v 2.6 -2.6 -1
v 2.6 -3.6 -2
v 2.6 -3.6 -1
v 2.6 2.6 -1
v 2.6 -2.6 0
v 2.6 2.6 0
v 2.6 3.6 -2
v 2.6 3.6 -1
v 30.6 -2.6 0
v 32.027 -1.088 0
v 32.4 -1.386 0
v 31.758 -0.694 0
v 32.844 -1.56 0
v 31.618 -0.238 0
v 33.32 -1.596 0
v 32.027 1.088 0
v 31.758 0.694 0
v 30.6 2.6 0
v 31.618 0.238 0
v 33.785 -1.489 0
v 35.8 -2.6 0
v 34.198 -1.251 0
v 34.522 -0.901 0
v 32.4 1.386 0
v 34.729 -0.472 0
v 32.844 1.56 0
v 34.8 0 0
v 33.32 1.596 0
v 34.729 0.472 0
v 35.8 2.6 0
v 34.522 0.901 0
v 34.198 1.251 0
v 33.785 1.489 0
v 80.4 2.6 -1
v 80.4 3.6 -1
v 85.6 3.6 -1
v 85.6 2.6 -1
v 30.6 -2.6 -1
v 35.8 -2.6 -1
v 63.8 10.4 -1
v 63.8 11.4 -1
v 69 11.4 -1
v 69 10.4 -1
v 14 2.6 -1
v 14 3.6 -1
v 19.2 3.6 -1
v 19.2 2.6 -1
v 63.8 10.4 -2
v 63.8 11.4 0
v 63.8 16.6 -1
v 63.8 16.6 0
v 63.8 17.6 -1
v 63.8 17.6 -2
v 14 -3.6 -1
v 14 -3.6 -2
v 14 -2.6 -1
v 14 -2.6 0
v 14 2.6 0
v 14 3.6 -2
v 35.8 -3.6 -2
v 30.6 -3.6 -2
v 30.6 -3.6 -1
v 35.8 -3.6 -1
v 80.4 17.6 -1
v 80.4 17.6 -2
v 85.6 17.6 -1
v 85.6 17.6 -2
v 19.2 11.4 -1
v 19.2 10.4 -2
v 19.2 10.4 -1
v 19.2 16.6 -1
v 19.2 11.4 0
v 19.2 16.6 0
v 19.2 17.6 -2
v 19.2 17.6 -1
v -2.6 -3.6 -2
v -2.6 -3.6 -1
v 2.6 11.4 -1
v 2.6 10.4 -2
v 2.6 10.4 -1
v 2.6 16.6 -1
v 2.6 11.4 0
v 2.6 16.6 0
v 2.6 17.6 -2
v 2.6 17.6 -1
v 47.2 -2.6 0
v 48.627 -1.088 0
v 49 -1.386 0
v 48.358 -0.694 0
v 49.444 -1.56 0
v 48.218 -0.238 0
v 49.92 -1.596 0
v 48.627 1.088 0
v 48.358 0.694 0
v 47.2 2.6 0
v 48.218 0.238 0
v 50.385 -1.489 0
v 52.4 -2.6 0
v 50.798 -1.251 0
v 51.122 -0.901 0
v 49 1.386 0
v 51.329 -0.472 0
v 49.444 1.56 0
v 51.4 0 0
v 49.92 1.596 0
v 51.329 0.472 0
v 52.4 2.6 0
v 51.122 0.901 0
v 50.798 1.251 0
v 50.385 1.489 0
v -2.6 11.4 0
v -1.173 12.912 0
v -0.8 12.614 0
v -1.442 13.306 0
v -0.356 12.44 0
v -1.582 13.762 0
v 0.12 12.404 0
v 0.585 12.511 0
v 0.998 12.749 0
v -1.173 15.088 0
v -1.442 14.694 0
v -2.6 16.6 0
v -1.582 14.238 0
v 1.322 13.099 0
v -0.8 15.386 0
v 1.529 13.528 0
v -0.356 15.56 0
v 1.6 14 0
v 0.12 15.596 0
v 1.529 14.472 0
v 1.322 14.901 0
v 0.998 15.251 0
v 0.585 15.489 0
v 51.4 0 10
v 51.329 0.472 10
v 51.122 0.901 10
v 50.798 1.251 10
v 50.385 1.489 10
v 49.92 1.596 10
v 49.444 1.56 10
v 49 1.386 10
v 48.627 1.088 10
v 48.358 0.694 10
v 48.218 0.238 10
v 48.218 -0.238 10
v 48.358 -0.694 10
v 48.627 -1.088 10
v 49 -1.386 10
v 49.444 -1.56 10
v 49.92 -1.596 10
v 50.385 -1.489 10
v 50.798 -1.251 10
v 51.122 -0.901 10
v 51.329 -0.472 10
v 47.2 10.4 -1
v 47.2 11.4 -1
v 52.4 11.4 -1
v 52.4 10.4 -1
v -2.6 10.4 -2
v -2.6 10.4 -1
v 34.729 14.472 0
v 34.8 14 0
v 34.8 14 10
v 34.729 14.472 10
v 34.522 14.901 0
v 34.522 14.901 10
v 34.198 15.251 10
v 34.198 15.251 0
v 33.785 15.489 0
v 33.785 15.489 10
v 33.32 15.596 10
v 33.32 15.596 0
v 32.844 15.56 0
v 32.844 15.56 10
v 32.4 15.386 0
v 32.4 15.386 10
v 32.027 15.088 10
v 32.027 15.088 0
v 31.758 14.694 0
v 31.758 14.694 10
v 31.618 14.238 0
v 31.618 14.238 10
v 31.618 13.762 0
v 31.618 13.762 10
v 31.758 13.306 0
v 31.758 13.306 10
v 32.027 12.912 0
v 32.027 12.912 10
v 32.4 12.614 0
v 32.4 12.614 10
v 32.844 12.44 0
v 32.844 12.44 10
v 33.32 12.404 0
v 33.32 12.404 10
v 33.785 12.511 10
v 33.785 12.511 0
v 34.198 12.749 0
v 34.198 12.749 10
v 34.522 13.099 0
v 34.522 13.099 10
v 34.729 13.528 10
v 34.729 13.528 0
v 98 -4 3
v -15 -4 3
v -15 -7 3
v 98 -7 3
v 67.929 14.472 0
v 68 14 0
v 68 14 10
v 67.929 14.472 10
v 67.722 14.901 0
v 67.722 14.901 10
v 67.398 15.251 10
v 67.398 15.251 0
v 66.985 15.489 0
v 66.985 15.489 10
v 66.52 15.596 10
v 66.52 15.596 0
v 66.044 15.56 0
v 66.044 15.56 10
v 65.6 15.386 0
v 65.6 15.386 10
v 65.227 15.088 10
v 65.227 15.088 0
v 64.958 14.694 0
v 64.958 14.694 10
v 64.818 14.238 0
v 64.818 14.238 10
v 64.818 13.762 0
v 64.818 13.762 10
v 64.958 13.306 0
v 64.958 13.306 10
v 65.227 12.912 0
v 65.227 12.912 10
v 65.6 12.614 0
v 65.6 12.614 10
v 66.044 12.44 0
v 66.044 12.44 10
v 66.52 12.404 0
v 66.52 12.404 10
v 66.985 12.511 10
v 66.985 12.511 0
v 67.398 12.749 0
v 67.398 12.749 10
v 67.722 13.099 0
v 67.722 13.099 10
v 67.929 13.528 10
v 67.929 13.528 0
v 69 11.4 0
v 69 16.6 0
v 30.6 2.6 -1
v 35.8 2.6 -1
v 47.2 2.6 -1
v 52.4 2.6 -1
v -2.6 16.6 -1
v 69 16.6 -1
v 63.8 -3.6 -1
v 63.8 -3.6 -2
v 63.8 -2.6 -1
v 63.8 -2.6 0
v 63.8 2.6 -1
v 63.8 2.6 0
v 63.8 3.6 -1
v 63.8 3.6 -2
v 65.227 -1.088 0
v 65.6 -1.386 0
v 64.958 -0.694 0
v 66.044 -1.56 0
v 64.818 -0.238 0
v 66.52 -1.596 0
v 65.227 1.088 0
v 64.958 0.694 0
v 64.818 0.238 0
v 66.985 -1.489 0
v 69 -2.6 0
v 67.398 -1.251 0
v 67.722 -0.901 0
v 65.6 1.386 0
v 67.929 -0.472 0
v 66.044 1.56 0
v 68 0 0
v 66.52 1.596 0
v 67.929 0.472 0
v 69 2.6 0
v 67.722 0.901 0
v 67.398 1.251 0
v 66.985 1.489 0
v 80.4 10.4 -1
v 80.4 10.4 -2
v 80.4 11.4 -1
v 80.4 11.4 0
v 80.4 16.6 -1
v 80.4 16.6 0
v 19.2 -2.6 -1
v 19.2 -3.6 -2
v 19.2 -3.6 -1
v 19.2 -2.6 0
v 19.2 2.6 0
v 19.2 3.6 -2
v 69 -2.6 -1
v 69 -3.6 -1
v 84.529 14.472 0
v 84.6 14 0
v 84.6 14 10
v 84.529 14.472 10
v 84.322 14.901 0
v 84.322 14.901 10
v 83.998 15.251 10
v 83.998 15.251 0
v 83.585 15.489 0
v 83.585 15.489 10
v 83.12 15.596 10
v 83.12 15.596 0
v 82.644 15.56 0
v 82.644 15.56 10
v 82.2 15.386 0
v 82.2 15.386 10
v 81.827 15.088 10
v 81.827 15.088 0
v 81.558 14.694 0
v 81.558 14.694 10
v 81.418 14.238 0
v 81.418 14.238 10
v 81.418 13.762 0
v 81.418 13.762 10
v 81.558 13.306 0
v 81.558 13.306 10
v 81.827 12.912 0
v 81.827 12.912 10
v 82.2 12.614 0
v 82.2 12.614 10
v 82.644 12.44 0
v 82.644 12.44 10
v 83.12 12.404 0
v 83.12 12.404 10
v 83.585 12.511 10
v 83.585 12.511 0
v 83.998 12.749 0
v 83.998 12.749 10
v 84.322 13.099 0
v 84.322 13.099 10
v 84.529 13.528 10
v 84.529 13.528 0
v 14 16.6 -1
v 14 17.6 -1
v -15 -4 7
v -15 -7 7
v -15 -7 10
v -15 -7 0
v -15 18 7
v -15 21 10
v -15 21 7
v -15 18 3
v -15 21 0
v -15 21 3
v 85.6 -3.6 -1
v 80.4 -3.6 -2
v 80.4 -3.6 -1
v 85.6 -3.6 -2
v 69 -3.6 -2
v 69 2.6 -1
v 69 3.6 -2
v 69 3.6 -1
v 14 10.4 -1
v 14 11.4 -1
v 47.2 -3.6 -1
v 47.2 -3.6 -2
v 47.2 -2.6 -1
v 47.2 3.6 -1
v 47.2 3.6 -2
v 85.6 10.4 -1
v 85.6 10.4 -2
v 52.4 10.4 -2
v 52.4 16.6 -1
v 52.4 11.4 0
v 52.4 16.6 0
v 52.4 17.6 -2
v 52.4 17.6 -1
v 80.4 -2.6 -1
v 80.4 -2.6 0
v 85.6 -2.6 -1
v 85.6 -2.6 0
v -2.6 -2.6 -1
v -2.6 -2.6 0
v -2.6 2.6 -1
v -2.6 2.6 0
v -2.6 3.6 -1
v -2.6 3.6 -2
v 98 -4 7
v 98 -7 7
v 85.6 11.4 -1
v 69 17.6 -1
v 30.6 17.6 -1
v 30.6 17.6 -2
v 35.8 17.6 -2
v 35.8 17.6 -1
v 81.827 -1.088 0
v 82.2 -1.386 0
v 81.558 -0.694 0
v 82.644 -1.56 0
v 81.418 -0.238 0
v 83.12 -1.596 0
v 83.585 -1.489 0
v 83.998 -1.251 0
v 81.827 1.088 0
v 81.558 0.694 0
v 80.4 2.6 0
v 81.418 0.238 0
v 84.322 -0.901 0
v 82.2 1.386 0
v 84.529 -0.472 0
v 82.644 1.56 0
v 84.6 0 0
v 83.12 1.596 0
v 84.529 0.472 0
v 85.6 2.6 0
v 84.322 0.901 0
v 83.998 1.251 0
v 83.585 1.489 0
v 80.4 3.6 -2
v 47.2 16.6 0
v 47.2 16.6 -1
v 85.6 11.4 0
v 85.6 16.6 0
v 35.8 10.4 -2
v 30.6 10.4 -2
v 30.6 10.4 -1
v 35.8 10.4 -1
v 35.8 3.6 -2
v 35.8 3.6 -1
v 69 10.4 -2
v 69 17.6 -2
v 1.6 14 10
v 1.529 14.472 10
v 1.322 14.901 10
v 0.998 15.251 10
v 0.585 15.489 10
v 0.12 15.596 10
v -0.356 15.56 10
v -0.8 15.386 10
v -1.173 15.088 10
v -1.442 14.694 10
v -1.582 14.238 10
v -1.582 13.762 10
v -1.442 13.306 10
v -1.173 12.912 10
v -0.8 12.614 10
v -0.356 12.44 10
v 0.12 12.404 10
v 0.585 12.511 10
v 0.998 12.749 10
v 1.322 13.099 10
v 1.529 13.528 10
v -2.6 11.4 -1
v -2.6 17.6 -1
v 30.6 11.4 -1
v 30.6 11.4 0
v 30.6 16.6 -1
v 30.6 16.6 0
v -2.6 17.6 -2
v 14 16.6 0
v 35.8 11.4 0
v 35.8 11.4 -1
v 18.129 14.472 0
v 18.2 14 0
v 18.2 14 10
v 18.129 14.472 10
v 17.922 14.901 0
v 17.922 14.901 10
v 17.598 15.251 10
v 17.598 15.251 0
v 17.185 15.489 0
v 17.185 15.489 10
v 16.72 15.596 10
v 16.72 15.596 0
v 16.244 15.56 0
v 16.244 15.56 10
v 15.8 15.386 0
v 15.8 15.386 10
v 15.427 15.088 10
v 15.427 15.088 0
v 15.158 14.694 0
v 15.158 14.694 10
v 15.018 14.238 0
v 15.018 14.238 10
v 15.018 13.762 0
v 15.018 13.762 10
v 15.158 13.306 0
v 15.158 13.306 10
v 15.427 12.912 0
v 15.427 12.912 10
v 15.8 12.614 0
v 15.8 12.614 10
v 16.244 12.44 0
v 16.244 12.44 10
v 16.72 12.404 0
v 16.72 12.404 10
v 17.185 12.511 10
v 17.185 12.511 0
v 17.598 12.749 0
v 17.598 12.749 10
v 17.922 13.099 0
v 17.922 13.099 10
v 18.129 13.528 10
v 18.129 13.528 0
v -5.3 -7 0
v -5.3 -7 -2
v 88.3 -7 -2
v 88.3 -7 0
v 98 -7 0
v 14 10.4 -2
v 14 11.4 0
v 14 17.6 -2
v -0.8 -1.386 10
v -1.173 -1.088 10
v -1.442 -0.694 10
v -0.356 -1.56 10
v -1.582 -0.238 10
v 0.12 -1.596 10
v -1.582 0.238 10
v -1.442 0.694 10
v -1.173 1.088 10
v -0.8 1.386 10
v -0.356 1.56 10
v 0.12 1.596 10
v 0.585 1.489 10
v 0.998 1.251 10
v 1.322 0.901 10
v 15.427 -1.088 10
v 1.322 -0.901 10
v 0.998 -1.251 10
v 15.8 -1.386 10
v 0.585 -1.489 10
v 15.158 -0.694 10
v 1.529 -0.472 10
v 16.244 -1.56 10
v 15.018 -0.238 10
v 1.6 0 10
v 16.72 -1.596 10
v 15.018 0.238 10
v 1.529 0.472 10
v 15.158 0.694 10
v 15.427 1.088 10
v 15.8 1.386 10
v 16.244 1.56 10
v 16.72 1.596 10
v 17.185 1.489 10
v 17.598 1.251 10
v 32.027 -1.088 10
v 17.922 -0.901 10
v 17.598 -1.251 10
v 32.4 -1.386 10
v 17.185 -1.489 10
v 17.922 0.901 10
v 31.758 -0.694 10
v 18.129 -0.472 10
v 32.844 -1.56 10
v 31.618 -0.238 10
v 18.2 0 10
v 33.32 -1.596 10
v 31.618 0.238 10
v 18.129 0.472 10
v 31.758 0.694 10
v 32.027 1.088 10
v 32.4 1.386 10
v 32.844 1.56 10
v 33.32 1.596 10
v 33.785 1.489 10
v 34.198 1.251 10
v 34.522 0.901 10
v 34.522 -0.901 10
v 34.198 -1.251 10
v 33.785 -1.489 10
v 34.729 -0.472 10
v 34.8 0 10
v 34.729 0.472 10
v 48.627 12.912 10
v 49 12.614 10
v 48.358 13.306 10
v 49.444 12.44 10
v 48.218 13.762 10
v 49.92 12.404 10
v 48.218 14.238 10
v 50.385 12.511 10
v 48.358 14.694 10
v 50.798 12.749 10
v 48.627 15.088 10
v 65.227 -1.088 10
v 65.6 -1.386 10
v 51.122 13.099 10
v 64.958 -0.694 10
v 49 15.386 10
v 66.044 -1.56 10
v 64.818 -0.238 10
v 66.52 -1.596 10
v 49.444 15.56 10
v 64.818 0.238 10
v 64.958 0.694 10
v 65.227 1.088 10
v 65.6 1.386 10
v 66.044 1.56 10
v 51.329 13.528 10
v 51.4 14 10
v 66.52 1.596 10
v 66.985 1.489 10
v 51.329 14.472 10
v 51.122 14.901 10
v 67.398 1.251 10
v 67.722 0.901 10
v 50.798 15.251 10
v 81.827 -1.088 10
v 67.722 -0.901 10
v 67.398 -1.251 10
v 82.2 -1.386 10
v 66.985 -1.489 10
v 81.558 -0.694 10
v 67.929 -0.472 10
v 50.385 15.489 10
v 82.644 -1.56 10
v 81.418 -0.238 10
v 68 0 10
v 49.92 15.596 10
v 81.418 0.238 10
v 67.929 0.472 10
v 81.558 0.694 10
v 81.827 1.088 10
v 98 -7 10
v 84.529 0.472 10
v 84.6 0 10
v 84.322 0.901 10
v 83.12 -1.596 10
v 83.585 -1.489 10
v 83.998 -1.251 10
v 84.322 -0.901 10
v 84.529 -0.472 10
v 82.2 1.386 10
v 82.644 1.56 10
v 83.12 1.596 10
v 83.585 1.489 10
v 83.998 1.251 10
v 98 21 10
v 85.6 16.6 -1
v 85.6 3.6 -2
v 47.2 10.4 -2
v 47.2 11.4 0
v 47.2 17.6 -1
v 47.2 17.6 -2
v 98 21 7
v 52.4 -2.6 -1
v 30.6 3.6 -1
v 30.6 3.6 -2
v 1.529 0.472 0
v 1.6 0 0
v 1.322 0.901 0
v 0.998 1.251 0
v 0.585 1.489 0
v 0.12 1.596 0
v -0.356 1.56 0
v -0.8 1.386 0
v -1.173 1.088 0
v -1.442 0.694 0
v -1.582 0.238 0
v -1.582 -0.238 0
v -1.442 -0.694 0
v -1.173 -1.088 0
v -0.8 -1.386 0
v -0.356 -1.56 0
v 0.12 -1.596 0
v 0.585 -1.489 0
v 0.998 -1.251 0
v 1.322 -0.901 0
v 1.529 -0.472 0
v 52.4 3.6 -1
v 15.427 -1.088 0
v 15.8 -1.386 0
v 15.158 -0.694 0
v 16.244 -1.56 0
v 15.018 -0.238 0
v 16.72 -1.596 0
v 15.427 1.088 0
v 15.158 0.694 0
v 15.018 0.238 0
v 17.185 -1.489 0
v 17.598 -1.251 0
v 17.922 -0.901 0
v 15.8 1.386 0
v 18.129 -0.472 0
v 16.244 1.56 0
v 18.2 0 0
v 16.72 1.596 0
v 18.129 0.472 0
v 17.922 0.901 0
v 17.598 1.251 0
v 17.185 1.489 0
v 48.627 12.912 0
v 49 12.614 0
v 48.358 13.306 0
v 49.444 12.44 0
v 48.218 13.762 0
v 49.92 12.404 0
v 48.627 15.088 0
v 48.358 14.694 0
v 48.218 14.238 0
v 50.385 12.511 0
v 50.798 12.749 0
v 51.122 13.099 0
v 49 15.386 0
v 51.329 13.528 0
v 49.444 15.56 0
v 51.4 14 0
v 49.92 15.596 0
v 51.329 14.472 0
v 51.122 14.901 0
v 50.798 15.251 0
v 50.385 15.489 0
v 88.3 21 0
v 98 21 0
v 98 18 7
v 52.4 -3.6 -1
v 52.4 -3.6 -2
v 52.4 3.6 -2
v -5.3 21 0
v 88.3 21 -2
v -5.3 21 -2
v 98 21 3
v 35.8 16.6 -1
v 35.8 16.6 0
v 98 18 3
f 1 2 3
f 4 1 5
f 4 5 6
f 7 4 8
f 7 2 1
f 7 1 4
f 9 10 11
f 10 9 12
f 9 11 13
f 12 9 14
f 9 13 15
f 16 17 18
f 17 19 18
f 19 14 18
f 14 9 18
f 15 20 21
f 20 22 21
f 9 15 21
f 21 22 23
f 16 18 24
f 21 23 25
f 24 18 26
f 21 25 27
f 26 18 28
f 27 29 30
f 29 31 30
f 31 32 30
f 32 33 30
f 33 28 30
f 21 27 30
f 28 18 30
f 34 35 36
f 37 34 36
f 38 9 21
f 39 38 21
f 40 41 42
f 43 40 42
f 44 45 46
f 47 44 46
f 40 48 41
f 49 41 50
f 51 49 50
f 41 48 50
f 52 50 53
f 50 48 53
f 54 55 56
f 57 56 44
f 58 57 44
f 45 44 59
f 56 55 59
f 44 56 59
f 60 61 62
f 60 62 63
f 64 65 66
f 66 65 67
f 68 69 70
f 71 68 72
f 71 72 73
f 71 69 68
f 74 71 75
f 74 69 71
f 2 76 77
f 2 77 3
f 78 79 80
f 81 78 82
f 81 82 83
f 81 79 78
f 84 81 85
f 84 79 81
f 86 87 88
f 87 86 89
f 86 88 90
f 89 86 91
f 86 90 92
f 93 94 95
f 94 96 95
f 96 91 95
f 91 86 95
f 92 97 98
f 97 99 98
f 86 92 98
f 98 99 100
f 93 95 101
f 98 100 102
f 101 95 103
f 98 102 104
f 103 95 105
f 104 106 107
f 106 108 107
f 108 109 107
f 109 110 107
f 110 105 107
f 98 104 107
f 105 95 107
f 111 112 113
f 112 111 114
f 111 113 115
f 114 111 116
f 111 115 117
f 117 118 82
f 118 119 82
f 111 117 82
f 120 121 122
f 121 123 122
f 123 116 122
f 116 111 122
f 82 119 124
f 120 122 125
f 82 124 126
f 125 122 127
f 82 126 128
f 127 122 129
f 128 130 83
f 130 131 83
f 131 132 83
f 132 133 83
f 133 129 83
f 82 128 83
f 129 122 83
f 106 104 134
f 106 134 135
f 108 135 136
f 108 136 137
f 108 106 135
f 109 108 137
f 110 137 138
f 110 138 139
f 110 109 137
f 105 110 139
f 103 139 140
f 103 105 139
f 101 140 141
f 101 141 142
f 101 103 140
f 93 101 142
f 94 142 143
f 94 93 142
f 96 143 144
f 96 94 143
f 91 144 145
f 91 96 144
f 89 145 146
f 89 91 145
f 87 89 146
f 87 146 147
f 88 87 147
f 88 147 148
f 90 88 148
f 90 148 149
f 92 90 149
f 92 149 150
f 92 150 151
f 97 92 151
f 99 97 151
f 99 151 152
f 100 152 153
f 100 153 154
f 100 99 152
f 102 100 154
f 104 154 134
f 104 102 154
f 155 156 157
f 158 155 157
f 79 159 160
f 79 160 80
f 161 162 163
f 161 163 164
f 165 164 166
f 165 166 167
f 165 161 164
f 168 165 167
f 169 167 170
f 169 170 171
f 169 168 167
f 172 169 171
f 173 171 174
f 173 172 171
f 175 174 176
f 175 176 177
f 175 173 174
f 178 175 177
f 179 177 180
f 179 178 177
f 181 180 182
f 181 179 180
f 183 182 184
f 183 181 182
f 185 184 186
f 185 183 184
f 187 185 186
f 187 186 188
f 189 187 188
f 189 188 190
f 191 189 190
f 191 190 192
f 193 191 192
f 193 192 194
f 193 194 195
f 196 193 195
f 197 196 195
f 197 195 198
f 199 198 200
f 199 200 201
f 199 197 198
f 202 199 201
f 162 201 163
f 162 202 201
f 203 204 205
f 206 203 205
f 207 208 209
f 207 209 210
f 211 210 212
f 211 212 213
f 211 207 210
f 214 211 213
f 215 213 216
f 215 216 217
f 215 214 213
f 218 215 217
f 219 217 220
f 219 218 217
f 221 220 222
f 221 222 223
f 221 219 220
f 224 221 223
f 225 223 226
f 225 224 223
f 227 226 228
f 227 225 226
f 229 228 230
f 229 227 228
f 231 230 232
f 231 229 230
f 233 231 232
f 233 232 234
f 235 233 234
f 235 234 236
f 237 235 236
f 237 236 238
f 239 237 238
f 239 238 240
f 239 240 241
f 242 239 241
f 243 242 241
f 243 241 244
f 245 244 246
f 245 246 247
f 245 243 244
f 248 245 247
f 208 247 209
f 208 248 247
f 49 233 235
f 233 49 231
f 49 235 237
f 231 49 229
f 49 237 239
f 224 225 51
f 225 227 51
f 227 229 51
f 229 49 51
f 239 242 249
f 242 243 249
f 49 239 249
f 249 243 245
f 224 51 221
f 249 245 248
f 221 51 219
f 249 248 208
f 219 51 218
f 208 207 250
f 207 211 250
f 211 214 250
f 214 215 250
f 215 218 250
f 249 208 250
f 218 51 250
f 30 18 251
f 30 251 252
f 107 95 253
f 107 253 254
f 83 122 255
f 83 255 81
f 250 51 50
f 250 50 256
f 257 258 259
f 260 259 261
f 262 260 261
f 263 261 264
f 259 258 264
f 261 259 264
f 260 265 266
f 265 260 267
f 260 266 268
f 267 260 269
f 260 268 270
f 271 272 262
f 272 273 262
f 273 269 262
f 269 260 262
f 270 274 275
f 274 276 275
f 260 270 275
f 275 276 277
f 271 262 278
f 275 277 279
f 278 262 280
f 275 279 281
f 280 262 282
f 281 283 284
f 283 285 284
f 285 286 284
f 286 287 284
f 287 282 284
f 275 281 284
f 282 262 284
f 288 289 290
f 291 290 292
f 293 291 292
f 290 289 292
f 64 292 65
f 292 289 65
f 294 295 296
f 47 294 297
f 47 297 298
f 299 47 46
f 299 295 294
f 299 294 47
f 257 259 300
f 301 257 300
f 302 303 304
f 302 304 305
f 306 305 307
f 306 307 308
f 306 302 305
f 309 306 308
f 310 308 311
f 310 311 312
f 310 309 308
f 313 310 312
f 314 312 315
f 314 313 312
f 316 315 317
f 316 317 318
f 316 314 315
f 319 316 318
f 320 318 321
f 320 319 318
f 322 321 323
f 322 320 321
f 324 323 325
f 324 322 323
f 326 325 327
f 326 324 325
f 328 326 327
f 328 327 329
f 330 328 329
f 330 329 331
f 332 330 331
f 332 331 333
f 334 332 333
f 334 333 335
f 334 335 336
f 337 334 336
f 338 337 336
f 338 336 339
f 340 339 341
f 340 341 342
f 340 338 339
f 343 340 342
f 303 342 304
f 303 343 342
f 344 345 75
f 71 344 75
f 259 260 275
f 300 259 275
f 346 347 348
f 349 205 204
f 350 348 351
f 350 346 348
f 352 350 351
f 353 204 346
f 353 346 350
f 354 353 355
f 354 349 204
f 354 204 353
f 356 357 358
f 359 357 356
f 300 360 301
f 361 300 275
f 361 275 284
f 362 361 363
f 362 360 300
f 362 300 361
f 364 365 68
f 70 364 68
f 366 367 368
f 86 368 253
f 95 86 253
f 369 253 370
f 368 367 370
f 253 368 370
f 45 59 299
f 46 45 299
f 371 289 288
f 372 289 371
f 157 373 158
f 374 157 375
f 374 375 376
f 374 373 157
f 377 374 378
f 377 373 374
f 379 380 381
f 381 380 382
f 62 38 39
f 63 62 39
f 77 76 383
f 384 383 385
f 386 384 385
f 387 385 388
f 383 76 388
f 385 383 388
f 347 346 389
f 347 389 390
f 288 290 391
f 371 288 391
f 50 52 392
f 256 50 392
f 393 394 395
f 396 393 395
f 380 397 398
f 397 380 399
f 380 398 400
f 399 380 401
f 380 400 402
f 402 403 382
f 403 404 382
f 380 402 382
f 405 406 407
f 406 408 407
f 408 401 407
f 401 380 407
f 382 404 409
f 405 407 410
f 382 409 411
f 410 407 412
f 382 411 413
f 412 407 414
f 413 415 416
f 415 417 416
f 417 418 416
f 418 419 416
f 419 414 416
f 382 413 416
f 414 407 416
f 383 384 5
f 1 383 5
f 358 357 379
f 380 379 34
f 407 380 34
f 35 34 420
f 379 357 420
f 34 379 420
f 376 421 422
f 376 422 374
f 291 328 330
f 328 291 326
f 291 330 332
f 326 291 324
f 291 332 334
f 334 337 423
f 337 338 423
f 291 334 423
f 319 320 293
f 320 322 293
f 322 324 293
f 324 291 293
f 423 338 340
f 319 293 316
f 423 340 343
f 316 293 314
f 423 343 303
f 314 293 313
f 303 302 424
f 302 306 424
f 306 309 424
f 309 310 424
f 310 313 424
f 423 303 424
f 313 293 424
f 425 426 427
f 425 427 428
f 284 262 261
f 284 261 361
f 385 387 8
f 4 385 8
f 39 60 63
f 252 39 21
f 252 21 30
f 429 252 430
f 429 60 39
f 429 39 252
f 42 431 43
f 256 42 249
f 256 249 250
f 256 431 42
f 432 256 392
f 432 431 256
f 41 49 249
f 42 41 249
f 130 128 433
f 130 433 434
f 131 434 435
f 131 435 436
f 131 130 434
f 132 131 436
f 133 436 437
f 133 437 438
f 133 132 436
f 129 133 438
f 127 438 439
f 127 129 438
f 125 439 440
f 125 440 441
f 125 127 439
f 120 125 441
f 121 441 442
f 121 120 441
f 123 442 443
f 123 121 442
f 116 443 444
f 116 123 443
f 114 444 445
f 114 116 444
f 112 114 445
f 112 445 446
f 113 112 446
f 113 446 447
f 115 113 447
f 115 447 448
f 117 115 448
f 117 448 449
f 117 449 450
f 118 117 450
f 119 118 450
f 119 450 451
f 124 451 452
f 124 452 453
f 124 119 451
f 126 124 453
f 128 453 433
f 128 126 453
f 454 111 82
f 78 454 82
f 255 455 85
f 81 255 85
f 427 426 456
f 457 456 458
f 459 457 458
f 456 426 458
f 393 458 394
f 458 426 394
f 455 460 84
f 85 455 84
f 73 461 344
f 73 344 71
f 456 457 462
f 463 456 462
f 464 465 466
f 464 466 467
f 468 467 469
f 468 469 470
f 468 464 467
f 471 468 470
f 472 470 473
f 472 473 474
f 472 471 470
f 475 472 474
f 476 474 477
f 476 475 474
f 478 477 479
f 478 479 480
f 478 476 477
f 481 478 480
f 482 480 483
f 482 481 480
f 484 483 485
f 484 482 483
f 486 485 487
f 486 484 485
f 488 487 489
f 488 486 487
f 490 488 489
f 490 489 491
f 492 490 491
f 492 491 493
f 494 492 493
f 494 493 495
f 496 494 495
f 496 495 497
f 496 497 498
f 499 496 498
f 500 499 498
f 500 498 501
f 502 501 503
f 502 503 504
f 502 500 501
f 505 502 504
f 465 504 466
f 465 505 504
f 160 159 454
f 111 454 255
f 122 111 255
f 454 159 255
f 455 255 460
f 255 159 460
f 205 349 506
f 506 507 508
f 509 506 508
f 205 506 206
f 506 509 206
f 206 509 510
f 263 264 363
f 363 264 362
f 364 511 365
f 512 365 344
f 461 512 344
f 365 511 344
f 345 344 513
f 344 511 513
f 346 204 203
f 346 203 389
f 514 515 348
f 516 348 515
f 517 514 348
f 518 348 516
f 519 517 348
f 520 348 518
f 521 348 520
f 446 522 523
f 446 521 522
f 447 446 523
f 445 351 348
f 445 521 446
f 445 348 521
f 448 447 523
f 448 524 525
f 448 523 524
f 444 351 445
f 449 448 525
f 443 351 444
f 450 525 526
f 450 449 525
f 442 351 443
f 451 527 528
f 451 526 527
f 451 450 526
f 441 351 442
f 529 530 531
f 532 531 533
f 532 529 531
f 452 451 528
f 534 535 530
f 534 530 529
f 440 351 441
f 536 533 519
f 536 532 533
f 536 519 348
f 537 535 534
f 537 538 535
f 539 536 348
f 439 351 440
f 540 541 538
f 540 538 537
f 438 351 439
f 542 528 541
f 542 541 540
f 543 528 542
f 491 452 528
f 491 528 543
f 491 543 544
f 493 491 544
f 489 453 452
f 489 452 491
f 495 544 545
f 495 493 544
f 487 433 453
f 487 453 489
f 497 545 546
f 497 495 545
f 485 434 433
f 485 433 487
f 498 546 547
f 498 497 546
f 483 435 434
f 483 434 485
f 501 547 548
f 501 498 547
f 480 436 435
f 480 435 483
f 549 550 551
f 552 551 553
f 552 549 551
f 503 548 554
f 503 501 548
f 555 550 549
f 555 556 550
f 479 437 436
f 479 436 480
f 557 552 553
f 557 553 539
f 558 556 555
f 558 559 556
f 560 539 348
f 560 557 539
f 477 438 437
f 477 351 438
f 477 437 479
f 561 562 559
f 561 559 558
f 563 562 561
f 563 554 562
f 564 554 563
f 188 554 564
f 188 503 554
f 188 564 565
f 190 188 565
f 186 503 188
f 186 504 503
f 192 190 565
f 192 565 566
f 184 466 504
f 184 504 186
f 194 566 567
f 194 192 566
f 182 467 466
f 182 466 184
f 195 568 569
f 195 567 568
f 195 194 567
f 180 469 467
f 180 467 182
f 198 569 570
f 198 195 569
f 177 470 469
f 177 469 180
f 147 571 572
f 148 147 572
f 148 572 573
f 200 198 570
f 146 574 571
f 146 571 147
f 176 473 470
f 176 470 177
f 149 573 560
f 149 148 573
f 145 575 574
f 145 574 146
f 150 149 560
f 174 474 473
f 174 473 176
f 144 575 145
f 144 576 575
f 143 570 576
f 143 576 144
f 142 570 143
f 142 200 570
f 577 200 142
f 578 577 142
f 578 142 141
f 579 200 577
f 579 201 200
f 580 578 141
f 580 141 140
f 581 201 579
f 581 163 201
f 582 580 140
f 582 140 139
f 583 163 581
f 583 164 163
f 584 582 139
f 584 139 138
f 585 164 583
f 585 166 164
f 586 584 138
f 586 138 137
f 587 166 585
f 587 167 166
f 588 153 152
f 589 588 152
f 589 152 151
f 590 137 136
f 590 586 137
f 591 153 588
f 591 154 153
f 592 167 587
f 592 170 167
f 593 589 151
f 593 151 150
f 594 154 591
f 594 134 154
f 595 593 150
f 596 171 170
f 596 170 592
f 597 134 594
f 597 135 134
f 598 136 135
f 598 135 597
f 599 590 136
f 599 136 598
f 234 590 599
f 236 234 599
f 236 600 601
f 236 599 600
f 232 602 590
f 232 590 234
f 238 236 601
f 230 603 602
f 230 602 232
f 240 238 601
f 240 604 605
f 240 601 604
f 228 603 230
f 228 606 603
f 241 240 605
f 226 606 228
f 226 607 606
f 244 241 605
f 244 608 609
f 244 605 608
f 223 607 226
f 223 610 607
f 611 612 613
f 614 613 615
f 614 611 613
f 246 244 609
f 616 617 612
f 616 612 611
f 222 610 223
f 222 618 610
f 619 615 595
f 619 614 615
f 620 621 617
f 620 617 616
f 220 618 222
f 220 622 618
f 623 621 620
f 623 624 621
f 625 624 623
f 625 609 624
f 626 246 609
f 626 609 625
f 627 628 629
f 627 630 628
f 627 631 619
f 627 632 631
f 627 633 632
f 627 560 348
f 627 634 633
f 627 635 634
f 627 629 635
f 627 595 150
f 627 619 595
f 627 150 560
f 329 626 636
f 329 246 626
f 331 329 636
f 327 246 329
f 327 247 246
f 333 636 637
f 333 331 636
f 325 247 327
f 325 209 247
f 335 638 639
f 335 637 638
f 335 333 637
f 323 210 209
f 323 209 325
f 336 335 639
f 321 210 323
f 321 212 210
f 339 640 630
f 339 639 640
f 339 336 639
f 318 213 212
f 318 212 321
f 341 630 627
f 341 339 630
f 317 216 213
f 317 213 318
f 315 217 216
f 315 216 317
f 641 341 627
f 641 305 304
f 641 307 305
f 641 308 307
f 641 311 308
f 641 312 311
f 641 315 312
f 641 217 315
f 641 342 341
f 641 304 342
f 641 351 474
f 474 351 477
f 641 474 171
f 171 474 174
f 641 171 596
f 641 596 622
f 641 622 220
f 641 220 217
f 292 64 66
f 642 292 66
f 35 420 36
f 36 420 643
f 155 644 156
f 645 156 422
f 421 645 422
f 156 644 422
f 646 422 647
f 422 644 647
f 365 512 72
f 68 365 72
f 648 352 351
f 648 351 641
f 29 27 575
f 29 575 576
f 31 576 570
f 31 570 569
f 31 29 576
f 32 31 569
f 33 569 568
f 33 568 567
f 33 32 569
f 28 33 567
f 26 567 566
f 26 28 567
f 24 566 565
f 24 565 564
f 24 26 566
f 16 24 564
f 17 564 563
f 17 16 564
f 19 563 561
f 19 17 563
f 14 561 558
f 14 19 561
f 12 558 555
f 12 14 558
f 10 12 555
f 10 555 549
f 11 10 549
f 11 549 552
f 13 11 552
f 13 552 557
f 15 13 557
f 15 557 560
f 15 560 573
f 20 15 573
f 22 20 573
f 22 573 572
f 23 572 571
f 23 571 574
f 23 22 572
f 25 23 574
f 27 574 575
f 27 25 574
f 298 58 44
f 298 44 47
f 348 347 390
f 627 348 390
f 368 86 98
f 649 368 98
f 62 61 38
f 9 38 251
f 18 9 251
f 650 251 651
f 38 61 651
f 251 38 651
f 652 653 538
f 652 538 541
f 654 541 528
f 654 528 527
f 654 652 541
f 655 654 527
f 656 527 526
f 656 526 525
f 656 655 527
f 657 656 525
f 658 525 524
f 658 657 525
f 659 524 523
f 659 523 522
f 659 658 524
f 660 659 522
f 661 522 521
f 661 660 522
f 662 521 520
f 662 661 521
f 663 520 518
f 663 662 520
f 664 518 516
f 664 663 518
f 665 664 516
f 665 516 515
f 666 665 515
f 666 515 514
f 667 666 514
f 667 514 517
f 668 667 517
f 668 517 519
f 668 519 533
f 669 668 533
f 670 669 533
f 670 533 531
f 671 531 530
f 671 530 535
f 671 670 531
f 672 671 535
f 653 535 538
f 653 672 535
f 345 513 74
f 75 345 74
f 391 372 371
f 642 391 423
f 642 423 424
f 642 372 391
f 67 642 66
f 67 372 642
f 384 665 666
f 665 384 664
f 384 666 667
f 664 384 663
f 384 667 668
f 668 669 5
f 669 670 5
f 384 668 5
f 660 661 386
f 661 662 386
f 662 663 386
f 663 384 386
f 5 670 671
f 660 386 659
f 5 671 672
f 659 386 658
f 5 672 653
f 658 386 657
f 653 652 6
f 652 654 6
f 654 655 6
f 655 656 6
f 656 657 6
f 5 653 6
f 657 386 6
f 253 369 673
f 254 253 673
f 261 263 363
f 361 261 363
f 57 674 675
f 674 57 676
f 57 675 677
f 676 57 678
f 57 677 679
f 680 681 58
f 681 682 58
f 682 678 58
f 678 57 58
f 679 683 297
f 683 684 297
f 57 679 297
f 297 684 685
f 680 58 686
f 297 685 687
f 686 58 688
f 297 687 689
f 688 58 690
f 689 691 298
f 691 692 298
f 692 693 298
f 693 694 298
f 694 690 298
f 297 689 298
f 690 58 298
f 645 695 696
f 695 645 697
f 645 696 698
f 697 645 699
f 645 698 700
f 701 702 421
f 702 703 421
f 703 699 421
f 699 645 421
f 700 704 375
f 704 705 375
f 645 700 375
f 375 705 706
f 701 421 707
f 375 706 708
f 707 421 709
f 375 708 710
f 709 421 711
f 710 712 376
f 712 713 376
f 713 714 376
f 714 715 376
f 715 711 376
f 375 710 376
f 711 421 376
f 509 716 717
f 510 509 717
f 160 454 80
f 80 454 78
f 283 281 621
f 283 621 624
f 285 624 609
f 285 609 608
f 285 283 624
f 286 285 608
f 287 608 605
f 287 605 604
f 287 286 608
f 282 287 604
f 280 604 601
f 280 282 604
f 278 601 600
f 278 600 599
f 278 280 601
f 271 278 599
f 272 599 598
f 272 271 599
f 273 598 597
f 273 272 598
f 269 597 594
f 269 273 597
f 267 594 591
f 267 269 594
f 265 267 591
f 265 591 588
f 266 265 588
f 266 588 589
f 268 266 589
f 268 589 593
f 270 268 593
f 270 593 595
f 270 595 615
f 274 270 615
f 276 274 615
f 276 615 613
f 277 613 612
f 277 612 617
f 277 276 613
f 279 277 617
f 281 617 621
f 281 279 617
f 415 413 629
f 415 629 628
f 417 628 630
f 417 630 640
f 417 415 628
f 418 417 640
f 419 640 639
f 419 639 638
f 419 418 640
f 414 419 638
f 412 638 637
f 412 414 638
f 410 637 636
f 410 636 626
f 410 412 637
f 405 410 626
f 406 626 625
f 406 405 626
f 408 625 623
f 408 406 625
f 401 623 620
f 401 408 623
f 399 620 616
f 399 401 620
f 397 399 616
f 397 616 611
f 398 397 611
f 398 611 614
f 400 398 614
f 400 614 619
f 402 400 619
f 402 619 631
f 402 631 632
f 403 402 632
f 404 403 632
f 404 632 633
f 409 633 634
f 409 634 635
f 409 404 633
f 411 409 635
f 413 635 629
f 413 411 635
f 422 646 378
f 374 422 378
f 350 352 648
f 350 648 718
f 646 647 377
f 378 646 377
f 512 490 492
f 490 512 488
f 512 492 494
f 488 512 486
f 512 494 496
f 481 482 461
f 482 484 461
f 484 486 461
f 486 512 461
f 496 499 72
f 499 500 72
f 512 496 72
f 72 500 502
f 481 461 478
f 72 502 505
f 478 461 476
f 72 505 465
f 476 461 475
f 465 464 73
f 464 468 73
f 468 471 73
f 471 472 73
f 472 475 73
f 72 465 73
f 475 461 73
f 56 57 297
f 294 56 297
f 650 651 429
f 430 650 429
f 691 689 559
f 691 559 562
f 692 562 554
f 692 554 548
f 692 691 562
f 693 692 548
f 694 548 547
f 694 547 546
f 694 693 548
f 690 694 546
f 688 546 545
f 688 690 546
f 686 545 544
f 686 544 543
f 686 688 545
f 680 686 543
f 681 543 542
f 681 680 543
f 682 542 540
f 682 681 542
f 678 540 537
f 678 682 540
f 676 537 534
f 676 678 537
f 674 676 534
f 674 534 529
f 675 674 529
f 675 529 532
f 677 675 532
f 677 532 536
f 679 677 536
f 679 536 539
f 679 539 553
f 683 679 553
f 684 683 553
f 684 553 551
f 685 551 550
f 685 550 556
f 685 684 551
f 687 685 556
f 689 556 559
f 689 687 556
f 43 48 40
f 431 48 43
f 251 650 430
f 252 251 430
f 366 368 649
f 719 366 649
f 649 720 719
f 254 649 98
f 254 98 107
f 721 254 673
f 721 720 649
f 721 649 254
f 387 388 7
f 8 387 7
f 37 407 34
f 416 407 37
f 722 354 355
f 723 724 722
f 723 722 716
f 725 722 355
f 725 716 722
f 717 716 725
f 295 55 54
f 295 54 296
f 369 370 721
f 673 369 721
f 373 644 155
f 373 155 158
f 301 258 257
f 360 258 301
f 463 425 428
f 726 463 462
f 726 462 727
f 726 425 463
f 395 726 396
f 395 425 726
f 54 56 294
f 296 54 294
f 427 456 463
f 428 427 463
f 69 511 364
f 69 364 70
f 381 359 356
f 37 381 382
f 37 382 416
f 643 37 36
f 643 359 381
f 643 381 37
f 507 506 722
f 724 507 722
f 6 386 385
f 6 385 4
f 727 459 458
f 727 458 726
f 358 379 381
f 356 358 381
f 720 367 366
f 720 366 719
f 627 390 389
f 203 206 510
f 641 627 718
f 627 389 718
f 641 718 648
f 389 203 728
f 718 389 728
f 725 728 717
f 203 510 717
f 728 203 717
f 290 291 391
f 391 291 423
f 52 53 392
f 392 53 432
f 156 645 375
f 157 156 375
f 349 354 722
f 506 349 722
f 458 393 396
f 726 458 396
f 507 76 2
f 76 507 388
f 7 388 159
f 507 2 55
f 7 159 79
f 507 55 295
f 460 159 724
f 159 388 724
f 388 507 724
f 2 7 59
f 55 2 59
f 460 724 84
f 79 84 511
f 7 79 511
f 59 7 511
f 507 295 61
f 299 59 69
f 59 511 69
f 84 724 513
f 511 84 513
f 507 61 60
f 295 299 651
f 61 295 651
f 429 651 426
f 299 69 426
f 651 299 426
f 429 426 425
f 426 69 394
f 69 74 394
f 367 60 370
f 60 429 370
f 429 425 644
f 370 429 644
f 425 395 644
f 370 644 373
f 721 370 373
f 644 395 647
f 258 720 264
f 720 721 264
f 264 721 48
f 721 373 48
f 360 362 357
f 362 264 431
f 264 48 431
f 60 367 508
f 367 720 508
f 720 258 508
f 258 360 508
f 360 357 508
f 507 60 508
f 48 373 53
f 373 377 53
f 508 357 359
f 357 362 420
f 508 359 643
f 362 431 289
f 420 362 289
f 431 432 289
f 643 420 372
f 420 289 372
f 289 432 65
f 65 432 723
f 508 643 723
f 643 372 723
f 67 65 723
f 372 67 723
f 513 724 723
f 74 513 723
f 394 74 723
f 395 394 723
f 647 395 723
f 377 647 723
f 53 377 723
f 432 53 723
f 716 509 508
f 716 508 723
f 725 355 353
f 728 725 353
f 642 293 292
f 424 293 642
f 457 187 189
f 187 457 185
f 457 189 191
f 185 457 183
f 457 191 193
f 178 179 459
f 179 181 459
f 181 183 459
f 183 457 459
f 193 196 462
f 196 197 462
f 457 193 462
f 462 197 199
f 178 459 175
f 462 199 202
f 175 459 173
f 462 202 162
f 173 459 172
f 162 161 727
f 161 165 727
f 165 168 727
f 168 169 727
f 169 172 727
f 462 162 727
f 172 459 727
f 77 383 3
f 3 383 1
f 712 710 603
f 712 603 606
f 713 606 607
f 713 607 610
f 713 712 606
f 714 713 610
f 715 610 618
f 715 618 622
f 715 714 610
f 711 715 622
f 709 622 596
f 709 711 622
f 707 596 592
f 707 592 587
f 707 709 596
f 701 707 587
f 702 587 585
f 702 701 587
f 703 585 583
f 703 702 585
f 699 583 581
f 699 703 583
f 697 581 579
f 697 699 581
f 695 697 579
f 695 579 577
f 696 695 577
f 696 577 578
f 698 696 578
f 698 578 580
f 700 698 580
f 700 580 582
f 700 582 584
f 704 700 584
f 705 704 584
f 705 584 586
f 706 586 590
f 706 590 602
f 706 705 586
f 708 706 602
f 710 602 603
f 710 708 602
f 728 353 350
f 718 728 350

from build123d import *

# Parameters (mm, degrees)
SKETCH_W        = 113
SKETCH_H        = 28
SKETCH_R        = 1.6
PAD_DEPTH       = 10
SKETCH001_W     = 93.6
SKETCH001_H     = 28
SKETCH001_W_2   = 5.2
SKETCH001_H_2   = 5.2
PAD001_DEPTH    = 2
SKETCH002_W     = 3
SKETCH002_H     = 4
POCKET_DEPTH    = 113.001
SKETCH003_W     = 5.2
SKETCH003_H     = 7.2
POCKET001_DEPTH = 1


with BuildPart() as part:
    # Sketch → Pad (new body)
    with BuildSketch(Plane.XY):
        with Locations((41.5, 7)):
            Rectangle(SKETCH_W, SKETCH_H)
        Circle(SKETCH_R, mode=Mode.SUBTRACT)
        with Locations((0, 14)):
            Circle(SKETCH_R, mode=Mode.SUBTRACT)
        with Locations((16.6, 0)):
            Circle(SKETCH_R, mode=Mode.SUBTRACT)
        with Locations((16.6, 14)):
            Circle(SKETCH_R, mode=Mode.SUBTRACT)
        with Locations((33.2, 0)):
            Circle(SKETCH_R, mode=Mode.SUBTRACT)
        with Locations((33.2, 14)):
            Circle(SKETCH_R, mode=Mode.SUBTRACT)
        with Locations((49.8, 0)):
            Circle(SKETCH_R, mode=Mode.SUBTRACT)
        with Locations((49.8, 14)):
            Circle(SKETCH_R, mode=Mode.SUBTRACT)
        with Locations((66.4, 0)):
            Circle(SKETCH_R, mode=Mode.SUBTRACT)
        with Locations((66.4, 14)):
            Circle(SKETCH_R, mode=Mode.SUBTRACT)
        with Locations((83, 0)):
            Circle(SKETCH_R, mode=Mode.SUBTRACT)
        with Locations((83, 14)):
            Circle(SKETCH_R, mode=Mode.SUBTRACT)
    extrude(amount=PAD_DEPTH)

    # Sketch001 → Pad001 (join)
    with BuildSketch(Plane.XY):
        with Locations((41.5, 7)):
            Rectangle(SKETCH001_W, SKETCH001_H)
        Rectangle(SKETCH001_W_2, SKETCH001_H_2, mode=Mode.SUBTRACT)
        with Locations((0, 14)):
            Rectangle(SKETCH001_W_2, SKETCH001_H_2, mode=Mode.SUBTRACT)
        with Locations((16.6, 0)):
            Rectangle(SKETCH001_W_2, SKETCH001_H_2, mode=Mode.SUBTRACT)
        with Locations((16.6, 14)):
            Rectangle(SKETCH001_W_2, SKETCH001_H_2, mode=Mode.SUBTRACT)
        with Locations((33.2, 0)):
            Rectangle(SKETCH001_W_2, SKETCH001_H_2, mode=Mode.SUBTRACT)
        with Locations((33.2, 14)):
            Rectangle(SKETCH001_W_2, SKETCH001_H_2, mode=Mode.SUBTRACT)
        with Locations((49.8, 0)):
            Rectangle(SKETCH001_W_2, SKETCH001_H_2, mode=Mode.SUBTRACT)
        with Locations((49.8, 14)):
            Rectangle(SKETCH001_W_2, SKETCH001_H_2, mode=Mode.SUBTRACT)
        with Locations((66.4, 0)):
            Rectangle(SKETCH001_W_2, SKETCH001_H_2, mode=Mode.SUBTRACT)
        with Locations((66.4, 14)):
            Rectangle(SKETCH001_W_2, SKETCH001_H_2, mode=Mode.SUBTRACT)
        with Locations((83, 0)):
            Rectangle(SKETCH001_W_2, SKETCH001_H_2, mode=Mode.SUBTRACT)
        with Locations((83, 14)):
            Rectangle(SKETCH001_W_2, SKETCH001_H_2, mode=Mode.SUBTRACT)
    extrude(amount=-PAD001_DEPTH)

    # Sketch002 (on Face2 of Pad001) → Pocket (cut, through all)
    with BuildSketch(Plane(origin=(-15, 0, 0), x_dir=(0, -1, 0), z_dir=(-1, 0, 0))):
        with Locations((-19.5, 5)):
            Rectangle(SKETCH002_W, SKETCH002_H)
        with Locations((5.5, 5)):
            Rectangle(SKETCH002_W, SKETCH002_H)
    extrude(amount=-POCKET_DEPTH, mode=Mode.SUBTRACT)

    # Sketch003 → Pocket001 (cut)
    with BuildSketch(Plane.XY.offset(-2)):
        Rectangle(SKETCH003_W, SKETCH003_H)
        with Locations((0, 14)):
            Rectangle(SKETCH003_W, SKETCH003_H)
        with Locations((16.6, 0)):
            Rectangle(SKETCH003_W, SKETCH003_H)
        with Locations((16.6, 14)):
            Rectangle(SKETCH003_W, SKETCH003_H)
        with Locations((33.2, 0)):
            Rectangle(SKETCH003_W, SKETCH003_H)
        with Locations((33.2, 14)):
            Rectangle(SKETCH003_W, SKETCH003_H)
        with Locations((49.8, 0)):
            Rectangle(SKETCH003_W, SKETCH003_H)
        with Locations((49.8, 14)):
            Rectangle(SKETCH003_W, SKETCH003_H)
        with Locations((66.4, 0)):
            Rectangle(SKETCH003_W, SKETCH003_H)
        with Locations((66.4, 14)):
            Rectangle(SKETCH003_W, SKETCH003_H)
        with Locations((83, 0)):
            Rectangle(SKETCH003_W, SKETCH003_H)
        with Locations((83, 14)):
            Rectangle(SKETCH003_W, SKETCH003_H)
    extrude(amount=POCKET001_DEPTH, mode=Mode.SUBTRACT)


solid = part.part
